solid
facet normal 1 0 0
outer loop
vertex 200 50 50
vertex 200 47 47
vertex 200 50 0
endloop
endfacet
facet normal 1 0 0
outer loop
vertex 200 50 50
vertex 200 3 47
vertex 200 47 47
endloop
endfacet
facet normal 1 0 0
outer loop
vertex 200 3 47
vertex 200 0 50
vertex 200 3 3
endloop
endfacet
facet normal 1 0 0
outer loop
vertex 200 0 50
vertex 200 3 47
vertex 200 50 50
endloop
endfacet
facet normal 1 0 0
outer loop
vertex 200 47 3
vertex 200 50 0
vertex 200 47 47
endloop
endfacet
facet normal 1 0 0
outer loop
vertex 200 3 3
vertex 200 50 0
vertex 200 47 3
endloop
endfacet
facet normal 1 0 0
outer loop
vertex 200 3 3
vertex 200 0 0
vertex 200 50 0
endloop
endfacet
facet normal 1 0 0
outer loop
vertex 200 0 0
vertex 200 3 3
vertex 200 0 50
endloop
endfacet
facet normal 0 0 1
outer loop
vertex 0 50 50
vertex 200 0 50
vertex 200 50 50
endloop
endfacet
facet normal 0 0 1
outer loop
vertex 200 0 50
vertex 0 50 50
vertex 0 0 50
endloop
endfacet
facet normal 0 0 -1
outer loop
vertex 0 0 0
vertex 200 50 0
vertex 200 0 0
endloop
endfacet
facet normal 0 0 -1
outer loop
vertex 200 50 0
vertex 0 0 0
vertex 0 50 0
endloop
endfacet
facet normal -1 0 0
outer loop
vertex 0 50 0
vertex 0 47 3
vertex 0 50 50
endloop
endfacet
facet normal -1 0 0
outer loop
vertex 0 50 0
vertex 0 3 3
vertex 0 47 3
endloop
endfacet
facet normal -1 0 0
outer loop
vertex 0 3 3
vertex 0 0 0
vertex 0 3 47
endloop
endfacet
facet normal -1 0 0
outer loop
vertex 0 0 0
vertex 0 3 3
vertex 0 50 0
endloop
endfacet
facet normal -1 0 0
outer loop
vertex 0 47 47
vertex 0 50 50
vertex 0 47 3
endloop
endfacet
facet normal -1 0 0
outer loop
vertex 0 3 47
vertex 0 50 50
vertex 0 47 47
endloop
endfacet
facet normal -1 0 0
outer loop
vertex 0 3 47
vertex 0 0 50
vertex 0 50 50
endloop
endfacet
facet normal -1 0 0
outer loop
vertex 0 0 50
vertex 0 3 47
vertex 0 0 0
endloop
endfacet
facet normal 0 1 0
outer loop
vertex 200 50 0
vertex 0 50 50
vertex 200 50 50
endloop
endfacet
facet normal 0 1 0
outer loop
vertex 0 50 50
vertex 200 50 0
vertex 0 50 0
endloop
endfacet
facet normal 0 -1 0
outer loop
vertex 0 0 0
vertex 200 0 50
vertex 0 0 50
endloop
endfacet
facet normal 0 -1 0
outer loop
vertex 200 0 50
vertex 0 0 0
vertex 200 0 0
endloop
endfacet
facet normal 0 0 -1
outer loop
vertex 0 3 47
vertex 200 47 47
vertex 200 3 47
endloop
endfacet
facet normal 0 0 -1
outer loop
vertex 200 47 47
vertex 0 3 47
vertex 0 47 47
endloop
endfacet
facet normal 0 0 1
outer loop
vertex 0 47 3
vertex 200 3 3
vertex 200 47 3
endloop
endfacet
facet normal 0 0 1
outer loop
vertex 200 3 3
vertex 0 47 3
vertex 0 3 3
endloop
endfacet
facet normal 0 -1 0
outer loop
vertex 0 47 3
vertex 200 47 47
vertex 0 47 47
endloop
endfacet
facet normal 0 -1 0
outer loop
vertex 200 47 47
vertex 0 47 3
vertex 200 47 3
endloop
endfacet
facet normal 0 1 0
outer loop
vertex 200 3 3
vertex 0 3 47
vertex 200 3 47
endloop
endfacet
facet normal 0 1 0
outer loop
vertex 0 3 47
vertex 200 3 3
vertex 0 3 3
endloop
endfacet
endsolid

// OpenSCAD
$fn = 32;

// ----------------------------------------------------------------------
// Box beam: 200-250 mm hollow beam
// ----------------------------------------------------------------------

// --- parameters (mm) ---
beam_l = 200;             // beam length, X
beam_w = 50;              // beam width, Y
beam_h = 50;              // beam height, Z
wall = 3;                 // wall thickness

difference() {
  cube([beam_l, beam_w, beam_h]);
  translate([-1, wall, wall])
    cube([beam_l + 2, beam_w - 2 * wall, beam_h - 2 * wall]);
}
